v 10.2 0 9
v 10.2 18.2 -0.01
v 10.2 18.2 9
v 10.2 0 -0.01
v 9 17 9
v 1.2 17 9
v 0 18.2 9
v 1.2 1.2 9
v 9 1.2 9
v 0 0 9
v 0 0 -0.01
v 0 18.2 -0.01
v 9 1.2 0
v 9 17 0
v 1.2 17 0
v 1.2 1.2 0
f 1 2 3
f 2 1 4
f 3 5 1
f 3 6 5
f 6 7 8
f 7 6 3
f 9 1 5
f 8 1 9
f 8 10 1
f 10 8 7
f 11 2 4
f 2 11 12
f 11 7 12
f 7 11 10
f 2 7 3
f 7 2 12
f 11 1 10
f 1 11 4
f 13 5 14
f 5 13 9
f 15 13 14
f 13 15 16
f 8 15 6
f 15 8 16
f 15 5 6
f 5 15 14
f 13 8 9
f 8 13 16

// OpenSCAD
// file: ../Base/Rotation.scad
// Fischertechnik Box Foundation
// Geometry Helpers Rotation

include <PlacementOptions.scad>

// getRotatedSpace(space, rotation=NoRotation)
// Rotates the space dependent on the specified rotation

function getRotatedSpace(space, rotation=NoRotation) = [
    (rotation == Rotate90 || rotation == Rotate270) ? space.y : space.x,
    (rotation == Rotate90 || rotation == Rotate270) ? space.x : space.y
];

// Rotates the given space around the fixed left lower corner
// space = the space the children needs as width/depth list [width,depth]
// rotation = 0 Rotate0 degrees, 1 Rotate90 degrees, 2 Rotate180 degrees, 3 Rotate270 degrees (equivalent to -90)

module RotateFix(space, rotation=NoRotation) {
    dy = (rotation == Rotate0 || rotation == Rotate270) ? 0 :
        (rotation == Rotate90) ? space.x :
        space.y;
    dx = (rotation < Rotate180) ? 0 :
        (rotation == Rotate180) ? space.x :
        space.y;
    
    translate([dx, dy, 0])
        rotate([0, 0, rotations[rotation]])
            children();
}
// file: ../Base/Alignment.scad
// Fischertechnik Box Foundation
// Geometry Helpers Alignment

include <PlacementOptions.scad>

// getAlignedX(elementWidth, spaceWidth, align=AlignRight, offset=0)
// Gets the aligned X offset of an element with the given
// width in the given space.
// elementWidth = The width of the element to positon
// spaceWidth = The space where the element should be aligned
// align = 0 AlignLeft, 1 AlignCenter, 2 AlignRight
// offset = an optional offset from the aligned position. When
// aligned left or centered, then positive values are in X direction.
// When aligned right then positive values are in negative X direction.

function getAlignedX(elementWidth, spaceWidth, align=AlignRight, offset=0) =
    (align == AlignLeft) ?
        offset :
        ((align == AlignCenter) ?
        (spaceWidth - elementWidth)/2 + offset :
        spaceWidth - offset - elementWidth);

// getAlignedY(elementDepth, spaceDepth, align=AlignTop, offset=0)
// Gets the aligned Y offset of an element with the given
// depth in the given space.
// elementDepth = The depth of the element to positon
// spaceDepth = The space where the element should be aligned
// align = 0 AlignBottom, 1 AlignCenter, 2 AlignTop
// offset = an optional offset from the aligned position. When
// aligned bottom or centered, then positive values are in Y direction.
// When aligned top then positive values are in negative Y direction.

function getAlignedY(elementDepth, spaceDepth, align=AlignTop, offset=0) =
    (align == AlignBottom) ?
        offset :
        ((align == AlignCenter) ?
        (spaceDepth - elementDepth)/2 + offset :
        spaceDepth - offset - elementDepth);
// file: ../Base/PlacementOptions.scad
// Fischertechnik Box Foundation
// Placement Options

// Alignment
NoAlign = 0;
AlignLeft = 1;
AlignBottom = 2;
AlignCenter = 3;
AlignRight = 4;
AlignTop = 5;

// Element rotation degree steps
rotations = [0, -90, -180, -270];

// Rotation
NoRotation = 0;
Rotate0 = 0;
Rotate90 = 1;
Rotate180 = 2;
Rotate270 = 3;

// Docking (seen from above)
NoDock = -1;
DockLeft = 0;
DockTop = 1;
DockRight = 2;
DockCorner = 2;
DockBottom = 3;

// Web corners
LowerLeft = 0;
UpperLeft = 1;
UpperRight = 2;
LowerRight = 3;

// Web position relative to corner
LeftOfCorner = 0;
RightOfCorner = 1;

// Rails direction
Horizontal = true;
Vertical = false;
// file: ../Base/Boxes.scad
// Fischertechnik Box Foundation
// Pre-designed Boxes

use <Constants.scad>

include <PlacementOptions.scad>

box190Width = 190;
box190Depth = 130;
box130Width = 130;
box130Depth = 95;

// Values are from an original ec3 box
topBottomDifference = 1.5;
outerHeight = 40;
baseThickness = 1.8;
innerHeight = outerHeight - baseThickness;
stackExcess = 5.7;
radius = 3.5;
wallThickness = 1.5;
tolerance = 0.2;

boxWallThickness = wallThickness;
boxBaseThickness = baseThickness;
boxWebWidth = 3.0;

// getBoxWallThickness()
// Gets the wall thickness of a Fischertechnik Box
function getBoxWallThickness() = boxWallThickness;

// getBoxUsageHeight(height = 38.2)
// Gets the usable height of a Fischertechnik box
// height = Outer height of the box from the bottom to the upper edge.
function getBoxUsageHeight(height = outerHeight) = height - baseThickness - stackExcess;

// getBoxInnerHeight()
// Gets the inner height of a Fischertechnik box, including the stack excess
function getBoxInnerHeight() = innerHeight;

// getBoxBaseThickness()
// Gets the thickness of the Fischertechnik box base.
function getBoxBaseThickness() = boxBaseThickness;

// getBoxWebWidth()
// Gets the width of a box web
function getBoxWebWidth() = boxWebWidth;

// getBox190Space()
// Gets the usable inner space of a Box 190 as an x/y-list
function getBox190Space() = [
    box190Width - 2*getBoxWallThickness() - topBottomDifference, 
    box190Depth - 2*getBoxWallThickness() - topBottomDifference ];

// RoundedCornerPlate(width, depth, height, radius)
// Creates a body plate with rounded corners for a box. Used
// also to create the complete box with the hull module.
// width = Width of the plate
// depth = depth of the plate 
// height = thickness of the plate
// radius = radius of the rounded corner
module RoundedCornerPlate(width, depth, height, radius) {
    translate([radius, radius])
    hull() {
        w = width-2*radius;
        d = depth-2*radius;
        cube([w, d, height]);
        cylinder(height, r=radius, $fn=getFragments());
        translate([w, 0])
            cylinder(height, r=radius, $fn=getFragments());
        translate([w, d])
            cylinder(height, r=radius, $fn=getFragments());
        translate([0, d])
            cylinder(height, r=radius, $fn=getFragments());
    }
}

// BoxBase(width, depth)
// Creates an empty stackable Fischertechnik compatible box
// width = Outer width of the box (190, 130, ...)
// depth = Outer depth of the box (130, 95, ...)

module BoxBase(width, depth, height=outerHeight) {    
    thinPlate = 0.01;

    innerHeight = height - baseThickness;    
    
    module Body(tolerance=tolerance) {
        hull() {
            // Bottom with tolerance to fit into the original boxes when stacked
            translate([-wallThickness+tolerance, -wallThickness+tolerance, -baseThickness])
                RoundedCornerPlate(width-topBottomDifference-2*tolerance, depth-topBottomDifference-2*tolerance, thinPlate, radius);
            
            // Top
            translate([-wallThickness-topBottomDifference/2, -wallThickness-topBottomDifference/2, innerHeight-thinPlate])
                RoundedCornerPlate(width, depth, thinPlate, radius);
         }
    }

    module Cutoff() {
        hull() {
            coWidth = width - 2*wallThickness;
            coDepth = depth - 2*wallThickness;
            
            // Bottom
            RoundedCornerPlate(coWidth-topBottomDifference, coDepth-topBottomDifference, thinPlate, radius);

            // Top
            translate([-topBottomDifference/2, -topBottomDifference/2, innerHeight+thinPlate]) 
                RoundedCornerPlate(coWidth, coDepth, thinPlate, radius);
        }
    }
    
    difference() {        
        Body();
        Cutoff();
        stackOffset = innerHeight - stackExcess;
        translate([0, 0, stackOffset + baseThickness])
            Body(tolerance=0);
    }
}

// Creates the Fischertechnik empty box 130x190 mm and places it at position 0,0
// 190x130 are the outer sizes, the inner space is slightly smaller. Use getBox190Space() to get the inner sizes.
// The box is positioned that the usable inner space is at the 0,0,0 position.

module Box190() {
    BoxBase(box190Width, box190Depth);
}

// Gets the usable inner space of a Box 130 as an x/y-list
function getBox130Space() = [
    box130Width - 2*getBoxWallThickness() - topBottomDifference, 
    box130Depth - 2*getBoxWallThickness() - topBottomDifference ];

// Creates the Fischertechnik empty box 95x130 mm and places it at position 0,0
// 190x130 are the outer sizes, the inner space is slightly smaller. Use getBox190Space() to get the inner sizes.
// The box is positioned that the usable inner space is at the 0,0,0 position.

module Box130() {
    BoxBase(box130Width, box130Depth);
}

// Creates a web at the specified box walls
// corner 0 = LowerLeft, 1 = UpperLeft, 2 = UpperRight, 3 = LowerRight
// side 0 = LeftOfCorner, 1 = RightOfCorner
// distance = Distance in mm from the corner
// boxSpace = inner width and depth of the box (default: Box 190)
// webWidth = length of the web (default is 3 mms)
// webThickness = thickness of the web (default is 1 mm)
// height = Height of the web (standard is getBoxUsageHeight())
// sink = How much of the web is sunk into the wall

module BoxWeb(
    corner, 
    side, 
    distance, 
    boxSpace=getBox190Space(), 
    webWidth=getBoxWebWidth(), 
    webThickness=1.0, 
    height=getBoxUsageHeight(),
    sink = getBoxWallThickness()/2) {
    width = (corner % 2 == 0) ? 
            (side == LeftOfCorner ? webWidth : webThickness) :
            (side == LeftOfCorner ? webThickness : webWidth);

    depth = (corner % 2 == 0) ? 
            (side == RightOfCorner ? webWidth : webThickness) :
            (side == RightOfCorner ? webThickness : webWidth);
    
    xDiff = corner == LowerLeft ? 
                (side == LeftOfCorner ? -sink : distance) :
            (corner == UpperLeft ?                
                (side == LeftOfCorner ? distance : -sink) :
            (corner == UpperRight ?
                (side == LeftOfCorner ? boxSpace.x-webWidth+sink : boxSpace.x-distance-webThickness) :
                (side == LeftOfCorner ? boxSpace.x-distance-webThickness: boxSpace.x-webWidth+sink)));

    yDiff = corner == LowerLeft ? 
                (side == RightOfCorner ? -sink : distance) :
            (corner == UpperLeft ?
                (side == RightOfCorner ? boxSpace.y-distance-webThickness : boxSpace.y-webWidth+sink) :
            (corner == UpperRight ?
                (side == RightOfCorner ? boxSpace.y-webWidth+sink : boxSpace.y-distance-webThickness) :
                (side == RightOfCorner ? distance : -sink)));
    
    translate([xDiff, yDiff, -getExcess()])
        cube([width, depth, height + 2*getExcess()]);
}
// file: ../Base/Placement.scad
// Fischertechnik Box Foundation
// Geometry Helpers Placement

use <Constants.scad>
use <Alignment.scad>
use <Rotation.scad>
use <Boxes.scad>

include <PlacementOptions.scad>

// Place(x=0, y=0, elementSpace=[0,0], alignX=AlignLeft, alignY=AlignBottom, rotation=Rotate0, boxSpace=getBox190Space())
// Places the child at the specified position
// y = Y-Position. This is a relative position when an X aligment is specified.
// x = X-Position. This is a relative position when an Y aligment is specified.
// elementSpace = space of the element to be placed [x,y]
// alignX = -1=NoAlign, 0 AlignLeft, 1 AlignCenter, 3 AlignRight (elementSpace and boxSpace required!)
// alignY = -1=NoAlign, 2 AlignBottom, 1 AlignCenter, 4 AlignTop (elementSpace and boxSpace required!)
// rotation = 0 Rotate0 0 degrees, 1 Rotate90 90 degrees, 
// 2 Rotate180 180 degrees, 3 Rotate270 270 degrees (equivalent to -90)
// boxSpace = Inner space of the box where the placement occurs [x,y] - default is Box 190x130 inner space

module Place(x=0, y=0, elementSpace=[0,0], 
  alignX=AlignLeft, alignY=AlignBottom, 
  rotation=NoRotation, boxSpace=getBox190Space()) {

    module Position(x, y, space, rotation=Rotate0) {
        translate([x, y, 0])
            RotateFix(space, rotation)
                children();
    }

    space = getRotatedSpace(elementSpace, rotation);
    alignedX = getAlignedX(space.x, boxSpace.x, alignX, x);
    alignedY = getAlignedY(space.y, boxSpace.y, alignY, y);
    Position(alignedX, alignedY, elementSpace, rotation)
        children();
}

// Center(space=getBox130Space(), elementSpace=[0,0])
// space = Space where the children is centered. For cylinder use centered=true and no elementSpace.
// elementSpace = space of the element to be centered [x,y]

module Center(space=getBox190Space(), elementSpace=[0,0]) {
    Place(elementSpace=elementSpace, boxSpace=space, alignX=AlignCenter, alignY=AlignCenter)
        children();
}

// CenterHorizontal(width=0, y=0, offset=0, space=getBox130Space())
// width = Width of the element to be placed.
// y = Y position of the element
// offset = Offset from the center position (negative will be left of the center)
// space = Space where the element is placed

module CenterHorizontal(width=0, y=0, offset=0, space=getBox190Space()) {
    Place(x=offset, y=y, elementSpace=[width, 0], boxSpace=space, alignX=AlignCenter)
        children(0);
}

// CenterVertical(depth=0, x=0, offset=0, space=getBox130Space())
// depth = Depth of the element to be placed.
// x = X position of the element
// offset = Offset from the center position (negative will be down of the center)
// space = Space where the element is placed

module CenterVertical(depth=0, x=0, offset=0, space=getBox190Space()) {
    Place(x=x, y=offset, elementSpace=[0, depth], boxSpace=space, alignY=AlignCenter)
        children(0);
}

// getIsVertical(align)
// True if the specified alignment needs a vertical orientation for a divider (AlignRight, AlignLeft)

function getIsVertical(align) = (align == AlignRight || align == AlignLeft);

// getIsHorizontal(align)
// True if the specified alignment needs a horizontal orientation for a divider (AlignTop, AlignBottom)

function getIsHorizontal(align) = (align == AlignTop || align == AlignBottom);
// file: ../Base/Constants.scad
// Fischertechnik Box Foundation
// Constants

// Constant values necessary for multiple elements

// Base constants
dividerThickness = 1.2;
excess = 0.01;
fragments = 90;
tolerance = 0.8;

// Gets the thickness of a divider 
function getDividerThickness() = dividerThickness;

// Gets the excess that is used to merge walls into each other
function getExcess() = excess;

// Gets amount of fragments of a cylinder
function getFragments() = fragments;

// Gets the inner tolerance of a frame to each side
function getTolerance() = tolerance;


// Fischertechnik specific constants
axisDiameter = 4;
axisBottomDiameter = axisDiameter + 1;
axisTolerance = 0.2;
axisLockingLength = 8;

// Gets axis diameter of Fischertechnik axis
function getAxisDiameter() = axisDiameter;

// Gets axis diameter tolerance (subtracted for element axis)
function getAxisTolerance() = axisTolerance;

// Gets the axis diameter for standing axis
function getStandAxisDiameter() = getAxisDiameter() - getAxisTolerance();

// Gets axis bottom diameter for thicker part at the bottom
function getAxisBottomDiameter() = axisBottomDiameter;

// Gets the lengthh of the locking part of a locking axis
function getAxisLockingLength() = axisLockingLength;

pinHeight = 2.5;
pinTolerance = 0.2;

// gets the height of a connecting pin
function getPinHeight() = pinHeight;

// gets the connecting pin height tolerance
function getPinTolerance() = pinTolerance;

standardEdgeDistance = 2.5;
standardWebDistance = 11.5;
standardCornerLength = 15;

// gets the standard distance to the wall of the box for dockable frames with webs
function getStandardEdgeDistance() = standardEdgeDistance;

// gets the standard distance of each web to the corner of the dockable frame
function getStandardWebDistance() = standardWebDistance;

// gets the standard length of the corner walls of a dockable frame
function getStandardCornerLength() = standardCornerLength;

tubeWallFactor = 0.8;

// gets the wall thickness of a tube.
function getTubeWallThickness() = tubeWallFactor * getDividerThickness();

smallPartsFrameHeight = 20;

// gets the frame height for docked small parts boxes.
function getSmallPartsFrameHeight() = smallPartsFrameHeight;

hubRingDiameter = 19.5;
hubRingLevelDiameter = 21;

// gets the diameter of a tube matching the inner ring of a wheel
function getHubRingDiameter() = hubRingDiameter;

// gets the diameter of a hub tube with a thicker diameter
function getHubRingLevelDiameter() = hubRingLevelDiameter;
// main file
// Fischertechnik Box Library
// Frame for 7.5 degrees angle blocks
// 32071

use <../Base/Constants.scad>
use <../ModelBase/Simple.scad>

/* [Element Parameters] */
count = 1;

/* [Hidden] */
width = 7;
depth = 15;
height = 9;

// getFrameAngle7p5Space
// Gets the space the frame for 7.5 degrees angle blocks needs for count blocks
// count = Count of angle blocks

function getFrameAngle7p5Space(count=1) = getFrameOuterVolume([width * count, depth, height]);

// FrameAngle7p5(count)
// count = Count of angle blocks in x direction
// The walls of the frame are 9 mm high.

module FrameAngle7p5(count=1) {
    Frame([width * count, depth, height]);
}

// Tests
color ("lightgray")
FrameAngle7p5(count);
